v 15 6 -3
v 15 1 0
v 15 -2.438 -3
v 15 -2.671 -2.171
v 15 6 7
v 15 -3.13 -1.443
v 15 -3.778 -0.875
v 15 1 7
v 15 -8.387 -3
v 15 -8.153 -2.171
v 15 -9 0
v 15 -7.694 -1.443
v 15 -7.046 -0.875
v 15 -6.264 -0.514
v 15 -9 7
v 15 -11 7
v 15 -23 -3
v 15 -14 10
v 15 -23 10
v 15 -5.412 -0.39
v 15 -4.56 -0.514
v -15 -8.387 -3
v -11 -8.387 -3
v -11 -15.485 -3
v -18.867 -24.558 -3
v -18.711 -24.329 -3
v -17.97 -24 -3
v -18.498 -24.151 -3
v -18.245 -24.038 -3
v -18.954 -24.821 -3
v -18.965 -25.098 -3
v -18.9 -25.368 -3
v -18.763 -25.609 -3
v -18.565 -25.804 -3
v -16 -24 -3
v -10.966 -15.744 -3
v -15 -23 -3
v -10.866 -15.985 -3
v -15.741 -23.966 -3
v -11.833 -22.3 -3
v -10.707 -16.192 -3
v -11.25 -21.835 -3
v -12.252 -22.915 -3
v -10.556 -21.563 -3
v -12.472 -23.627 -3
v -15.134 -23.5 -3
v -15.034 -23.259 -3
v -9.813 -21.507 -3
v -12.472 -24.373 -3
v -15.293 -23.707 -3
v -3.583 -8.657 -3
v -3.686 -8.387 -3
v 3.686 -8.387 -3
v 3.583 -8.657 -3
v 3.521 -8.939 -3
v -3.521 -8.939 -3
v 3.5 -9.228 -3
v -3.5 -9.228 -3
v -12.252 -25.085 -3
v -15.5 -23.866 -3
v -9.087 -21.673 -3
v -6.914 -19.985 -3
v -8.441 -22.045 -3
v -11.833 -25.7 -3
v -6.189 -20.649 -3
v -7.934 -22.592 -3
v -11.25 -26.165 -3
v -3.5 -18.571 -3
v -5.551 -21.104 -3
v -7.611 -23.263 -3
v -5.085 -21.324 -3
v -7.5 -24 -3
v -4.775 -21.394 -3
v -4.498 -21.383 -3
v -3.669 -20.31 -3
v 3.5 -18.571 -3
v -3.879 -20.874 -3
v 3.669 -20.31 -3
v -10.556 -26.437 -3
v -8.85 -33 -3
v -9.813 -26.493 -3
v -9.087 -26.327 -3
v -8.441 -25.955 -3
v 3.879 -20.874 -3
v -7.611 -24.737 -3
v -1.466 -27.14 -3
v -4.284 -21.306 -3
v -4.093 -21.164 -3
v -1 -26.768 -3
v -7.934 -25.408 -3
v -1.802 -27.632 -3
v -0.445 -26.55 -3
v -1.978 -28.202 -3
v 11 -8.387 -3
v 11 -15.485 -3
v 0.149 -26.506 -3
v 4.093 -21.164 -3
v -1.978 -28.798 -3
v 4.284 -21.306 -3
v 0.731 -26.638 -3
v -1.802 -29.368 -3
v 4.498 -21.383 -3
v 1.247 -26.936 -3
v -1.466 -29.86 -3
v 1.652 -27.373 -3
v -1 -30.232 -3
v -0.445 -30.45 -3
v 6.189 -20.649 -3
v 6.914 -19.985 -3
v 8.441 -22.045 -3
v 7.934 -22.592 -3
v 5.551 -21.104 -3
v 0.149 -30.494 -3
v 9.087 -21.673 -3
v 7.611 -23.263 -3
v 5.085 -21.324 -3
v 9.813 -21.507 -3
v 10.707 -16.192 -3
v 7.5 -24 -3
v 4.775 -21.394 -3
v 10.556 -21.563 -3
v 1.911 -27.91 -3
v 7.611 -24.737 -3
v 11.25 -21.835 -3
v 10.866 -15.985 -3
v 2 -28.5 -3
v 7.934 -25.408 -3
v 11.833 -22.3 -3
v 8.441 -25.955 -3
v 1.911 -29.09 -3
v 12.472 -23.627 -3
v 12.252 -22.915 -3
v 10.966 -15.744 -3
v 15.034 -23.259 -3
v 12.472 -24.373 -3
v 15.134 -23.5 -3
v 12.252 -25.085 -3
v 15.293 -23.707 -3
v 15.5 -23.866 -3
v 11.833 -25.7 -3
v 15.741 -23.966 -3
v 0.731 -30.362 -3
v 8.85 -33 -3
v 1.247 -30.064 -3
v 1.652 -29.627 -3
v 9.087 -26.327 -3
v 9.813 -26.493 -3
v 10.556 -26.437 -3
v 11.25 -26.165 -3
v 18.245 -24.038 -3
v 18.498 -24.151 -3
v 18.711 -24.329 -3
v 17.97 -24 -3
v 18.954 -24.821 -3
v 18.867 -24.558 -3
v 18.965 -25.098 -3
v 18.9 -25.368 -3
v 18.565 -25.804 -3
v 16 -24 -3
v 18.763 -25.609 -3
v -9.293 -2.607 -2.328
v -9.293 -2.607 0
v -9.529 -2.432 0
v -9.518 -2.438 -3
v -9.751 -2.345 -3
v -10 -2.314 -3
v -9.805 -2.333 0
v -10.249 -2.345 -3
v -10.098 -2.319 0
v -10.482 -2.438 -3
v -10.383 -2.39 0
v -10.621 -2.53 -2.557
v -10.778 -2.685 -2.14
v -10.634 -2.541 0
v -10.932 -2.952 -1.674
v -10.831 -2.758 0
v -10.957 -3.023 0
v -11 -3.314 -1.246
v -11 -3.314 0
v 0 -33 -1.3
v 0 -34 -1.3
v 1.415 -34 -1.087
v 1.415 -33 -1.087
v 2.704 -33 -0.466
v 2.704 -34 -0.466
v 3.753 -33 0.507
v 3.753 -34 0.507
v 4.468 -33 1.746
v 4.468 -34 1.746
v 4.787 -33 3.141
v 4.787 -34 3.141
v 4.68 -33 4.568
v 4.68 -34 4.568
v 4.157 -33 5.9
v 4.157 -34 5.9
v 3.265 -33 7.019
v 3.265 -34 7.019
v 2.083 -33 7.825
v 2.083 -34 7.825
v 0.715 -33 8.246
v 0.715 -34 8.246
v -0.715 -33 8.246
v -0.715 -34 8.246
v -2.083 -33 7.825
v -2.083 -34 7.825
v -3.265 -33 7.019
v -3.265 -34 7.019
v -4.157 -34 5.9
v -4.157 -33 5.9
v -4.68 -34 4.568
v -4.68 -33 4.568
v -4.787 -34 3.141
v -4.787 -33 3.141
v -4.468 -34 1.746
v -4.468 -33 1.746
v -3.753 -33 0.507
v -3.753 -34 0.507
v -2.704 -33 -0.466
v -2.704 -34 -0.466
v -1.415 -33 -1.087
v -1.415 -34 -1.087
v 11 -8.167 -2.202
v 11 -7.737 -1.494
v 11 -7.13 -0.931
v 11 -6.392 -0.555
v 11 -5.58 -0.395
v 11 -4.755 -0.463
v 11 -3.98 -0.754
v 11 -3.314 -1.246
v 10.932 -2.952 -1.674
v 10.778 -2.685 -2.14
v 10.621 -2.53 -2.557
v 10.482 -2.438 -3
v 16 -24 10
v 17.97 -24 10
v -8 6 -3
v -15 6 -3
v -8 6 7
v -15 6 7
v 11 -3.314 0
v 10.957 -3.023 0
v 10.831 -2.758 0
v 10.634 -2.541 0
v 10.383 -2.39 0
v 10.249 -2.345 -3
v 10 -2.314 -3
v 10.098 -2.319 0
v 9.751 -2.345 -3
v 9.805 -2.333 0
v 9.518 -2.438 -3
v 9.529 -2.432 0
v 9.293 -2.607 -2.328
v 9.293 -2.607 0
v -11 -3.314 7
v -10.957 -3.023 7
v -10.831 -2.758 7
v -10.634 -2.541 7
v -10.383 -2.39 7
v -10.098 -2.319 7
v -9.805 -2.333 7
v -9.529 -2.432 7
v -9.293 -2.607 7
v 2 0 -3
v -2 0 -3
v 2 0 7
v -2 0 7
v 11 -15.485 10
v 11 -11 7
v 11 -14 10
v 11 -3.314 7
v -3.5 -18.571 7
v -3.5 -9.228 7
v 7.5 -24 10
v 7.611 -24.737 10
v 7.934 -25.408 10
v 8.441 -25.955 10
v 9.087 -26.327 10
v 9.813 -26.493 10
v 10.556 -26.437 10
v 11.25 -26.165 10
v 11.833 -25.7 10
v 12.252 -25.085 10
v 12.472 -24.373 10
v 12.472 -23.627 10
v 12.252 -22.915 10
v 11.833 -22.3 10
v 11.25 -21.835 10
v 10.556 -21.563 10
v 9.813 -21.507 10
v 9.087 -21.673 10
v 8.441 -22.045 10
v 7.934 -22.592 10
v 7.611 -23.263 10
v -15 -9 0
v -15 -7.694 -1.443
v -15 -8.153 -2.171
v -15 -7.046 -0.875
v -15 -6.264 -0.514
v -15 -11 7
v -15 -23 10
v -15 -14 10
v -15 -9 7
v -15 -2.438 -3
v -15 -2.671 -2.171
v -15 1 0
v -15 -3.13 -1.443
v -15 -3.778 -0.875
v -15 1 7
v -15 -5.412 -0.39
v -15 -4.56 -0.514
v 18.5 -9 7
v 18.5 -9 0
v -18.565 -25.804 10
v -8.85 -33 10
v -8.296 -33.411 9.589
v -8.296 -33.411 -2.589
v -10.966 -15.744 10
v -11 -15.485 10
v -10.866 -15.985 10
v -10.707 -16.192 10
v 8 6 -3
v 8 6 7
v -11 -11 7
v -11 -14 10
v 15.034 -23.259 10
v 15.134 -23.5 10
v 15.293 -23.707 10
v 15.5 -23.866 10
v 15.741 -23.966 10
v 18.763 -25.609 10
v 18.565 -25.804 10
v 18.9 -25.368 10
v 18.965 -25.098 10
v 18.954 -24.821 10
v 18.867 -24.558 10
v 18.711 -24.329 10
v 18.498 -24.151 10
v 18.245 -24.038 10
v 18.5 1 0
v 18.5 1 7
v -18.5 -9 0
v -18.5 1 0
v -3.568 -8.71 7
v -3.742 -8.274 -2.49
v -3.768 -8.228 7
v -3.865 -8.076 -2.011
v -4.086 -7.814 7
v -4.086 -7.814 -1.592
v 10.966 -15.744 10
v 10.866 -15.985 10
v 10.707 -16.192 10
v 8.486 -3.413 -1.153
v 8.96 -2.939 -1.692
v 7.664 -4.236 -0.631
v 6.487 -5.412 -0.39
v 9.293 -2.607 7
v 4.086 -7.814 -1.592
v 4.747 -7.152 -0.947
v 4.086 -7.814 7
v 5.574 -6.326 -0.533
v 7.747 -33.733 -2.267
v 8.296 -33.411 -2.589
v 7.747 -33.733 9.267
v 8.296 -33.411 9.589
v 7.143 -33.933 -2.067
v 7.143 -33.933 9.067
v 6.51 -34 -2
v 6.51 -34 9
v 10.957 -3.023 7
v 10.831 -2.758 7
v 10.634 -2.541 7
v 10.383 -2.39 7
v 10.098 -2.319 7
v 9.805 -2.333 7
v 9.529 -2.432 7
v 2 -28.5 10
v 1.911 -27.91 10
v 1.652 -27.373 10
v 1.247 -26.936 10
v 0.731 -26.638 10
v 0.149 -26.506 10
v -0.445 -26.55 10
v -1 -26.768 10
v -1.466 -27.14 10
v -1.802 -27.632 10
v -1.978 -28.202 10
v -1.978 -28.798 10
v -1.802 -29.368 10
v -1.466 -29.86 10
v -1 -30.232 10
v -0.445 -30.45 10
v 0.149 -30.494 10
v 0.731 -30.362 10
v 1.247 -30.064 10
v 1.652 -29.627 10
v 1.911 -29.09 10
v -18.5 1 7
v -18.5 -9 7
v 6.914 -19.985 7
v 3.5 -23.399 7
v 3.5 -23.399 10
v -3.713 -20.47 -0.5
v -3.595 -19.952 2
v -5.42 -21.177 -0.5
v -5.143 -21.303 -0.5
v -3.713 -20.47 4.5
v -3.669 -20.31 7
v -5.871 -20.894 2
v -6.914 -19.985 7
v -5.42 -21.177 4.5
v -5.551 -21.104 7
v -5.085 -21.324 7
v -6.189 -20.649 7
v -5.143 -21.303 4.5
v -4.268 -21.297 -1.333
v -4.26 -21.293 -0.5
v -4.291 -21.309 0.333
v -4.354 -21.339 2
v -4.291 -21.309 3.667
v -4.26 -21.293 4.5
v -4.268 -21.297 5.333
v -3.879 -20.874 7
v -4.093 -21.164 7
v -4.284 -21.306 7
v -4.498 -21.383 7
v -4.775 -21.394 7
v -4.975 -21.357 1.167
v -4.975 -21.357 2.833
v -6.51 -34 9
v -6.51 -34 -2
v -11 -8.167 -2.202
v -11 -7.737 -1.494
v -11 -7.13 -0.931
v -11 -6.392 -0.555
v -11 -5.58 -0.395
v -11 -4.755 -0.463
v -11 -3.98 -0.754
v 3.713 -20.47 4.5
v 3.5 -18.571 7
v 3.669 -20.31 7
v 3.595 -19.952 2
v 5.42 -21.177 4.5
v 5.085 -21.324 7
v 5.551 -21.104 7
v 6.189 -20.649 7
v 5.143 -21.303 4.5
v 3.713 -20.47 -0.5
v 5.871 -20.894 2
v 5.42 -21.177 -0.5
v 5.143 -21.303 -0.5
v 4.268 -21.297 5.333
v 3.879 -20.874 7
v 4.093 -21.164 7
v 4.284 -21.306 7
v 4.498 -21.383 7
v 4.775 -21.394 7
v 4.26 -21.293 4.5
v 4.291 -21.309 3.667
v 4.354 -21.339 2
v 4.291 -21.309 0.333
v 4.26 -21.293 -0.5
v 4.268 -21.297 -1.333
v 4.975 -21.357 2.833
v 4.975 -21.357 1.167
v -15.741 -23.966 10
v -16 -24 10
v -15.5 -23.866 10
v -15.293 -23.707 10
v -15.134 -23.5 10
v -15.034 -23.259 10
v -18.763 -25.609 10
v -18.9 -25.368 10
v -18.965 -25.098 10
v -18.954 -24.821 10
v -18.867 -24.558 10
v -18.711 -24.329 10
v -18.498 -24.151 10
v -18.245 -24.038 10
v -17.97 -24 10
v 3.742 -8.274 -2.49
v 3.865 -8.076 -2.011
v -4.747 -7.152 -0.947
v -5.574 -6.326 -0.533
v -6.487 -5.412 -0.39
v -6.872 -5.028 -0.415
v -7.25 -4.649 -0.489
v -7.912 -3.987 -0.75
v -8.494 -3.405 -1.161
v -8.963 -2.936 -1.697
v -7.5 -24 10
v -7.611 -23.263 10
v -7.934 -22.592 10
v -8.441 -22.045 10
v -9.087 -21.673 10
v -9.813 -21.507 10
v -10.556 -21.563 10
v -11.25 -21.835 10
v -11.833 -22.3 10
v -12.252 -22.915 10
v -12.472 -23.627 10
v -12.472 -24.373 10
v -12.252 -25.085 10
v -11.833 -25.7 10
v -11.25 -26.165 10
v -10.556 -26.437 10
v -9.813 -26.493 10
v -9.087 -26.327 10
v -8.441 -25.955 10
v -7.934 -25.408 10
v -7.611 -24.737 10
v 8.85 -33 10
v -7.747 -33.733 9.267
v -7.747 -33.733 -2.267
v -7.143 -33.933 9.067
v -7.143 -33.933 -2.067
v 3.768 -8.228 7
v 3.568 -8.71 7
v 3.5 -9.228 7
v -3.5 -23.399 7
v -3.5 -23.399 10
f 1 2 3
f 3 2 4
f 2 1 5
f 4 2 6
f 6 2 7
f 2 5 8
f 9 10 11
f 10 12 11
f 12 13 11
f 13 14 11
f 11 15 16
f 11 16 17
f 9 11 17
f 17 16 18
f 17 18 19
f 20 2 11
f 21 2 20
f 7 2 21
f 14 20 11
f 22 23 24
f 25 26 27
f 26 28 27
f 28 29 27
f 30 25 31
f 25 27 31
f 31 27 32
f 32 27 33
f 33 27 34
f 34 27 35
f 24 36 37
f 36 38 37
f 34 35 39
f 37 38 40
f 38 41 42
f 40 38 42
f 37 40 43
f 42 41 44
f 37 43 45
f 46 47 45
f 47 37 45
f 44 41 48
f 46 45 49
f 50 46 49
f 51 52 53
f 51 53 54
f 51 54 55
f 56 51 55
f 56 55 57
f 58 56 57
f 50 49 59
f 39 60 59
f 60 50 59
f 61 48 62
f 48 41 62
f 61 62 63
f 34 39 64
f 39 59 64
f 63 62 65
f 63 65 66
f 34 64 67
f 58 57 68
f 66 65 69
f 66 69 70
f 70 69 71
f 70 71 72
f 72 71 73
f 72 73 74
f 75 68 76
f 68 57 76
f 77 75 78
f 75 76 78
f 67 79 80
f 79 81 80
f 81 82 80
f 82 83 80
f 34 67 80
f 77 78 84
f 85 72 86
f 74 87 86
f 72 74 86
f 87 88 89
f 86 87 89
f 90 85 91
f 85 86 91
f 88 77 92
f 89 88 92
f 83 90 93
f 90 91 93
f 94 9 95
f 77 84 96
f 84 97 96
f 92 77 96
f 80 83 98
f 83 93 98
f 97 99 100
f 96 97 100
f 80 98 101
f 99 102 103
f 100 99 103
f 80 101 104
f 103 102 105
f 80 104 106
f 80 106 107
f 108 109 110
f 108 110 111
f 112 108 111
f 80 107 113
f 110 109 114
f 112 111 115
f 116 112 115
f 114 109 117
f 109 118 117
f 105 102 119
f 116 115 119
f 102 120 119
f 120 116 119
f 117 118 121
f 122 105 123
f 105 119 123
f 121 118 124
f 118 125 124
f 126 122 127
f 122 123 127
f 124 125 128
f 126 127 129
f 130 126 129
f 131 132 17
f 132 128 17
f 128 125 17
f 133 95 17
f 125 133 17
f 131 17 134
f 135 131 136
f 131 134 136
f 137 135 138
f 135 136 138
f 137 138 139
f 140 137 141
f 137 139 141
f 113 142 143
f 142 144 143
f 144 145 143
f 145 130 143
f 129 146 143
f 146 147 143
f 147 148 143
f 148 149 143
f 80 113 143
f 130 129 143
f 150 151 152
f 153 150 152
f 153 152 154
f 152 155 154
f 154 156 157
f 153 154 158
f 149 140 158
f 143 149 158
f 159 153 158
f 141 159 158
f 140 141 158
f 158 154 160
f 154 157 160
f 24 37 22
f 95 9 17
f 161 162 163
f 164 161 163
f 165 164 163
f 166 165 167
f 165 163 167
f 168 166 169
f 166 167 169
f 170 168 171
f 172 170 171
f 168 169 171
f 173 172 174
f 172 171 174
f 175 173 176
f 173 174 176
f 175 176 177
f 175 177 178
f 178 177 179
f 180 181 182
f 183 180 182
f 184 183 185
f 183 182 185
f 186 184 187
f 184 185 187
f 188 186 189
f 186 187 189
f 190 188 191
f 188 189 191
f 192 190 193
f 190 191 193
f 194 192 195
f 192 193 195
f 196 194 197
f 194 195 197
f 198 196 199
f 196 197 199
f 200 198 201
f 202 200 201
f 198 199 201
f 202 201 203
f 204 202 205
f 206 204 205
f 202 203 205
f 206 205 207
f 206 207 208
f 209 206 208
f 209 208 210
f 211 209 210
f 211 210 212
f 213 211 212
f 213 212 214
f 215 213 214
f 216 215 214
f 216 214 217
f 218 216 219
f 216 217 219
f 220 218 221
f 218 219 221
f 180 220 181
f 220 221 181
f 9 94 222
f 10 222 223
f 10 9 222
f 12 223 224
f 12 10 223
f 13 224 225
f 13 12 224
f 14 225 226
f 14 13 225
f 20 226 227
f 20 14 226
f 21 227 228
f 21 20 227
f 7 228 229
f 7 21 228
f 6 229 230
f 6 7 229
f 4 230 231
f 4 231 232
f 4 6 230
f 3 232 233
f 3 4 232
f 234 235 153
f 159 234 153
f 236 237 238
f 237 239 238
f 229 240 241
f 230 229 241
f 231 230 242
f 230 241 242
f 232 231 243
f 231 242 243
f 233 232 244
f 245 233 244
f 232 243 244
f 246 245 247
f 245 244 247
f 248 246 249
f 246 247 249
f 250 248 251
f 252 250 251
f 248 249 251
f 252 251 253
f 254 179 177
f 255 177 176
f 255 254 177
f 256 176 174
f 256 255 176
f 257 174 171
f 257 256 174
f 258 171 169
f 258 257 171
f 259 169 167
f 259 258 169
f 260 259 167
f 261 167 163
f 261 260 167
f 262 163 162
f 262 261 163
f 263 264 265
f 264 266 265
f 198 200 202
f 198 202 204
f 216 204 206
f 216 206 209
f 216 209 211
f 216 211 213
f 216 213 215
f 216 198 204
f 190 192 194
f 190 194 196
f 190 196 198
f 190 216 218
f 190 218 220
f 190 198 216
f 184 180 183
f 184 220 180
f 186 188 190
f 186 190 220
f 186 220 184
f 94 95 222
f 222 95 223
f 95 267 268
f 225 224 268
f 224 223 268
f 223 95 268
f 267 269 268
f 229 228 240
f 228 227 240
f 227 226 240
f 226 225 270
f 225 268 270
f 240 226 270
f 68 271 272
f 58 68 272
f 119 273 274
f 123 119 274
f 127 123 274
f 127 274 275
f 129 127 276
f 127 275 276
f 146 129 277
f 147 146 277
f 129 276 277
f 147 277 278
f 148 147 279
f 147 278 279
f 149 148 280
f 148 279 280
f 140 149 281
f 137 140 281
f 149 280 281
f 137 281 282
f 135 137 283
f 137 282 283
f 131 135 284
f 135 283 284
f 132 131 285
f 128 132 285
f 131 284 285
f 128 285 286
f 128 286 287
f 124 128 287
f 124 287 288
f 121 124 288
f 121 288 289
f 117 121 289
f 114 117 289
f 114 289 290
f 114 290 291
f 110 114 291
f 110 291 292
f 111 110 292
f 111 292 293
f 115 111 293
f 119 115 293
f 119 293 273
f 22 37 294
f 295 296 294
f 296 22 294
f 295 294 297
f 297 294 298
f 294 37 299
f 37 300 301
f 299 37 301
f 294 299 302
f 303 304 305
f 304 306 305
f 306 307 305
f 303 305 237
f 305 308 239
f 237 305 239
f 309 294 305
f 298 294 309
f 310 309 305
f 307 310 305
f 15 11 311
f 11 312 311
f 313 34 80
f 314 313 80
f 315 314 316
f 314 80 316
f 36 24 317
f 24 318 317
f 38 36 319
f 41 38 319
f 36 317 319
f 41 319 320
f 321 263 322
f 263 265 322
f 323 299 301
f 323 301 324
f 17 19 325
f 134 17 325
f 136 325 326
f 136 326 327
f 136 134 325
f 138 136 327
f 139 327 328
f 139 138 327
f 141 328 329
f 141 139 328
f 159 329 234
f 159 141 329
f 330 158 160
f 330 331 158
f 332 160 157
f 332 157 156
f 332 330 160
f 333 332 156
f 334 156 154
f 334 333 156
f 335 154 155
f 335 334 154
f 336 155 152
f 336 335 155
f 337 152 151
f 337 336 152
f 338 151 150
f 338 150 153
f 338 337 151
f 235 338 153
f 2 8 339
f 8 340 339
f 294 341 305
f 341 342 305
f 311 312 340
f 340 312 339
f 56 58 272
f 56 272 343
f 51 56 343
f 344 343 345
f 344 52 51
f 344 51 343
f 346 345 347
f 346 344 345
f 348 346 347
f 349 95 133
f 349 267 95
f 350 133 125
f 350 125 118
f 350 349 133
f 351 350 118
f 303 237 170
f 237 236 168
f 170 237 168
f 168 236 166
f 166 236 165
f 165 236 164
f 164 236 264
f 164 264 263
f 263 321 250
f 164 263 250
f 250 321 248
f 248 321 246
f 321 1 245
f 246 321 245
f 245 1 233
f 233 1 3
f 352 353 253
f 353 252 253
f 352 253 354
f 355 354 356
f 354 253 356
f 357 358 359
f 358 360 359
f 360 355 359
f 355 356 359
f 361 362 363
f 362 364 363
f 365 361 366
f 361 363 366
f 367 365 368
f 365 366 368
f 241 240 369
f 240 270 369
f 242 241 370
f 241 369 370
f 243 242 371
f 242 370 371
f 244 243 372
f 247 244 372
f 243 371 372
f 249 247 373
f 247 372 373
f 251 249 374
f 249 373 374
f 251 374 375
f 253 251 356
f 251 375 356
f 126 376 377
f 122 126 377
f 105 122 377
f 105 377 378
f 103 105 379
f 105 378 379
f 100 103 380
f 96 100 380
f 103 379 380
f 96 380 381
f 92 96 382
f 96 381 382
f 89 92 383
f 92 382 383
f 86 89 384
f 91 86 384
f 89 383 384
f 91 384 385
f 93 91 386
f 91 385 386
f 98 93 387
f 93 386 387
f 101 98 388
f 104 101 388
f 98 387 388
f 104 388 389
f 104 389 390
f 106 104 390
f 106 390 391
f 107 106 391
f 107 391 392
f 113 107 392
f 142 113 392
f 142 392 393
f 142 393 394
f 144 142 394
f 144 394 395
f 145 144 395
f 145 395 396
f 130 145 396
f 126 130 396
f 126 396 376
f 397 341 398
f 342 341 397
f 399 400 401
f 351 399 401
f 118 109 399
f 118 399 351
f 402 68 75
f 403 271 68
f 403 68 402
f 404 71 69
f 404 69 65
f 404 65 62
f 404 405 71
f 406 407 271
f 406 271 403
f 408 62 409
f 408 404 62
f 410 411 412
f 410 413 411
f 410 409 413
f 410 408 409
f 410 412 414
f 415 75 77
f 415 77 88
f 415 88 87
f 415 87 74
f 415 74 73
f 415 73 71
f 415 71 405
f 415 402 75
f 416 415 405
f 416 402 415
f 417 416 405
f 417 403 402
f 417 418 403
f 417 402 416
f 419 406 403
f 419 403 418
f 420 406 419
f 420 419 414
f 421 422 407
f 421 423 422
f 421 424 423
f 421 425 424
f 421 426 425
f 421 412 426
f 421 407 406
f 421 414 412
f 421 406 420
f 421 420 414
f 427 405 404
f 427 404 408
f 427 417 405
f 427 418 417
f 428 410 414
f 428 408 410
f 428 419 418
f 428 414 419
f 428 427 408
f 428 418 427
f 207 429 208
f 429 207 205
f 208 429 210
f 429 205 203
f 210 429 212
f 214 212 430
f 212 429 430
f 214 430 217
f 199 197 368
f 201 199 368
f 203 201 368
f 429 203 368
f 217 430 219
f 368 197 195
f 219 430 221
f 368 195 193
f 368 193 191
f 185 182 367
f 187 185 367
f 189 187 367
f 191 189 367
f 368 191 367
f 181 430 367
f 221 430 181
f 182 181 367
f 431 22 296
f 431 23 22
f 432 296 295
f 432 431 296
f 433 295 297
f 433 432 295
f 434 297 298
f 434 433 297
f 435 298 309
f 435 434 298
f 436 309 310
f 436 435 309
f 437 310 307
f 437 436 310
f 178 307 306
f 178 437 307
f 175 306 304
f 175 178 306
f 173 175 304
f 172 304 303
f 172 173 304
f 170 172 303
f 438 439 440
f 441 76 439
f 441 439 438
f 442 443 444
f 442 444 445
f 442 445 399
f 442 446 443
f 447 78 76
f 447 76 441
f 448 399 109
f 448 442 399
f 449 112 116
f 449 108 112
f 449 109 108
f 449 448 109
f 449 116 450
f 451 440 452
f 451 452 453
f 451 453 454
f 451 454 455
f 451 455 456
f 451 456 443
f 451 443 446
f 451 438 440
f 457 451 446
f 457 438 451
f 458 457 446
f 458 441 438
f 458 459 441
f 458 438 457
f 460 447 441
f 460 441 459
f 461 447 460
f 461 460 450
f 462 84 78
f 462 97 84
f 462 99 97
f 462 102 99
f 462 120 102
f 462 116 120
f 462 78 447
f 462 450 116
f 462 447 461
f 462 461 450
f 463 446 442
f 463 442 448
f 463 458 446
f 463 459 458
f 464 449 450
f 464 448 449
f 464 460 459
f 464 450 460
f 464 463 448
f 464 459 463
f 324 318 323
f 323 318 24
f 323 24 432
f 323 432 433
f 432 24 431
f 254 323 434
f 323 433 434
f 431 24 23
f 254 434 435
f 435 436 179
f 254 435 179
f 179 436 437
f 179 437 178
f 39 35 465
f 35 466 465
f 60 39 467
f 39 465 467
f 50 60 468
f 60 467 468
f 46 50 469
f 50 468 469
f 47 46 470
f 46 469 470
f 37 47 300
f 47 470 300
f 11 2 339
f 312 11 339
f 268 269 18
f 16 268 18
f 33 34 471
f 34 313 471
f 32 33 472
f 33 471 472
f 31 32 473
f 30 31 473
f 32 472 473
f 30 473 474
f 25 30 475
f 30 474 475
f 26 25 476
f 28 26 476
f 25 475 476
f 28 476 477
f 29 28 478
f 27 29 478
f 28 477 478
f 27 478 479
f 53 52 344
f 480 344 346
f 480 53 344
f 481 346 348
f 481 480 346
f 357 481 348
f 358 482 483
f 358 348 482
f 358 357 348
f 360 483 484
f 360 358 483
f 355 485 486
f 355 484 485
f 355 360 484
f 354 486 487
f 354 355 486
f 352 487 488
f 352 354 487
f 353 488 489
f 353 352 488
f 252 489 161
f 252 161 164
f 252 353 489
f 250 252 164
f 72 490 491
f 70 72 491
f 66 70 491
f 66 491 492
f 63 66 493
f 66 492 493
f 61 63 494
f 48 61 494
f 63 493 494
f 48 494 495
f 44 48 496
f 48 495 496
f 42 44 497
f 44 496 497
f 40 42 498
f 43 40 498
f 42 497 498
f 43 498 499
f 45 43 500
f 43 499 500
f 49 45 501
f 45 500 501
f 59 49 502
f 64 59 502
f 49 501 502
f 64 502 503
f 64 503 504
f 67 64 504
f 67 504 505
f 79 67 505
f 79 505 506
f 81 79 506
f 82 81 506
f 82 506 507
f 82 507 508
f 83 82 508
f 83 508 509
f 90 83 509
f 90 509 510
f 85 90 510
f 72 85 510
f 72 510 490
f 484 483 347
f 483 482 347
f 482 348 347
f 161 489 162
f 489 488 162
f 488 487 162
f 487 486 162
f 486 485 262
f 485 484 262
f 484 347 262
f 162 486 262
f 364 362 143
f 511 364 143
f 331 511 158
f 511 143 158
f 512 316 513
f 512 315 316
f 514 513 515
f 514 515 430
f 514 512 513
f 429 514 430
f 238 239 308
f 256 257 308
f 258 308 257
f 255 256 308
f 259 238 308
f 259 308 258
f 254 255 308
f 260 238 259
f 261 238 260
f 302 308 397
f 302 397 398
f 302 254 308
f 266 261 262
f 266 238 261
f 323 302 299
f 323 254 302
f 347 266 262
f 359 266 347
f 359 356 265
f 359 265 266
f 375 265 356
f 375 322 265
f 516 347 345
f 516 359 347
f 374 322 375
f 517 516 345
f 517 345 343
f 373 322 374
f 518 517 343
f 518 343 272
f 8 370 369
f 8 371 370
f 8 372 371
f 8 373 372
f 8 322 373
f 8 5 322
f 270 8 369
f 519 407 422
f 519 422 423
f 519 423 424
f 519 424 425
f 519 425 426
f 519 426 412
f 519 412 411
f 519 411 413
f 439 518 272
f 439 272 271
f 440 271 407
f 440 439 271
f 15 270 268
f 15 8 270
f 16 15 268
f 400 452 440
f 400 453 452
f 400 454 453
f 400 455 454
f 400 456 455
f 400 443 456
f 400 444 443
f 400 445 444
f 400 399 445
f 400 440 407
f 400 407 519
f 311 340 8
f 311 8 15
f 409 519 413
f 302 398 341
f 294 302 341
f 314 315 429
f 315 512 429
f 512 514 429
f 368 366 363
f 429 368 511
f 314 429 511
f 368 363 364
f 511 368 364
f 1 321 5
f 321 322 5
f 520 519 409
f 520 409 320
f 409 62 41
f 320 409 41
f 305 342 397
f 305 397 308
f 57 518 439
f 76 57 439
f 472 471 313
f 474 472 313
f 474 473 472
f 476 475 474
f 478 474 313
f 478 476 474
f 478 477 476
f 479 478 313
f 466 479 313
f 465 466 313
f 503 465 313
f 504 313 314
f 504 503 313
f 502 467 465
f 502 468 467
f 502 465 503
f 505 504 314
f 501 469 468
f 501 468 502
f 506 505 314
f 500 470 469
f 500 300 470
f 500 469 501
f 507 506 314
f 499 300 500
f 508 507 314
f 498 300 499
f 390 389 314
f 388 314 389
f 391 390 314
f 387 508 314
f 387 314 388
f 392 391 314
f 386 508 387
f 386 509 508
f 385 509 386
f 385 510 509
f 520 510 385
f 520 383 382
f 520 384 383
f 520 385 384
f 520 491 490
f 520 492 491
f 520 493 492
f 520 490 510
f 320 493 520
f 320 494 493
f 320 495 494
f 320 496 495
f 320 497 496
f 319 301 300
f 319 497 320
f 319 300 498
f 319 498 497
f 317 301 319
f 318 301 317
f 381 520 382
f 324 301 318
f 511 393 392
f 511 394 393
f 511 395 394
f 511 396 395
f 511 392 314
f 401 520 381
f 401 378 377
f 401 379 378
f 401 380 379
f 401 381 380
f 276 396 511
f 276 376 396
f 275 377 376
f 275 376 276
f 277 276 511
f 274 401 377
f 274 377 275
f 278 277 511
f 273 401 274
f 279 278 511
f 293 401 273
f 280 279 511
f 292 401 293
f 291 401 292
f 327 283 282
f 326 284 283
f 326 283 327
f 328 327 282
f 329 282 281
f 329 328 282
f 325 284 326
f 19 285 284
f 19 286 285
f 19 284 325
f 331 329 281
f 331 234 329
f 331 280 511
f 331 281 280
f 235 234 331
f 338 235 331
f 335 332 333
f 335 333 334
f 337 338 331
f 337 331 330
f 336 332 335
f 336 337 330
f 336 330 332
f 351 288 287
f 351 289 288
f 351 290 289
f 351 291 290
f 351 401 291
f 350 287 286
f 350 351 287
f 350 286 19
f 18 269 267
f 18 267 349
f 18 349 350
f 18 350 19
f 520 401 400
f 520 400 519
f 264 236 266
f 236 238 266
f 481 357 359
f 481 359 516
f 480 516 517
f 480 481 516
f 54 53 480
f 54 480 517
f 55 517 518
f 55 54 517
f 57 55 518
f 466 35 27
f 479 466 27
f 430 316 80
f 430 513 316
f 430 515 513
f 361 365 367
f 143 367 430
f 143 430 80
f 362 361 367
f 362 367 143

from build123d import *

# Parameters (mm, degrees)
ESQUISSE1_W             = 2.5
ESQUISSE1_H             = 10
BOSS_EXTRU_1_DEPTH      = 7
BOSS_EXTRU_2_DEPTH      = 3
BOSS_EXTRU_2_DEPTH_BACK = 10
ENL_V_MAT_EXTRU_1_REACH = 44.024
ESQUISSE4_4_W           = 7
ESQUISSE4_4_H           = 9.399494937
ENL_V_MAT_EXTRU_4_DEPTH = 3
ENL_V_START             = -13
ESQUISSE4_W             = 7
ESQUISSE4_H             = 9.399494937
ENL_V_MAT_EXTRU_2_DEPTH = 3
CHANFREIN1_SIZE         = 3
CONG_1_R                = 1
ESQUISSE5_R             = 4.8
ENL_V_MAT_EXTRU_5_DEPTH = 1
ESQUISSE6_R             = 2.5
ESQUISSE6_R_2           = 2
ENL_V_MAT_EXTRU_6_DEPTH = 42.047043387
CHANFREIN2_SIZE         = 1
SKETCH_1_W              = 7
SKETCH_1_H              = 5
CUT_EXTRUDE_1_DEPTH     = 1
SKETCH_2_W              = 7
SKETCH_2_H              = 5
CUT_EXTRUDE_2_DEPTH     = 1
EXTRUDE_1_DEPTH         = 3
FILLET_1_R              = 3
FILLET_2_R              = 1
FILLET_3_R              = 2
CUT_EXTRUDE_START       = -30
SKETCH_5_R              = 3
CUT_EXTRUDE_3_DEPTH     = 30


# Some blends are built 0.0001 mm under size
with BuildPart() as part:
    # Esquisse1 → Boss.-Extru.1 (new body)
    with BuildSketch(Plane.XY):
        Polygon((-8, 6), (-16, 6), (-16, 1), (-16, -9), (-16, -24), (-21, -24), (-7.5, -34), (0, -34), (0, 0), (-2, 0), align=None)
        Polygon((2, 0), (0, 0), (0, -34), (7.5, -34), (21, -24), (16, -24), (16, -9), (16, 1), (16, 6), (8, 6), align=None)
        with Locations((17.25, -4)):
            Rectangle(ESQUISSE1_W, ESQUISSE1_H)
        with Locations((-17.25, -4)):
            Rectangle(ESQUISSE1_W, ESQUISSE1_H)
    extrude(amount=BOSS_EXTRU_1_DEPTH)

    # Esquisse2 → Boss.-Extru.2 (add, two sides: drawn at the far end of the back side and taken through both)
    with BuildSketch(Plane.XY.offset(7).offset(-BOSS_EXTRU_2_DEPTH_BACK)):
        Polygon((16, -14), (-16, -14), (-16, -24), (-21, -24), (-7.5, -34), (7.5, -34), (21, -24), (16, -24), align=None)
    extrude(amount=BOSS_EXTRU_2_DEPTH + BOSS_EXTRU_2_DEPTH_BACK)

    # Esquisse3 → Enlèv. mat.-Extru.1 (cut, up to next)
    with BuildSketch(Plane(origin=(0, 0, -3), x_dir=(-1, 0, 0), z_dir=(0, 0, -1)), mode=Mode.PRIVATE) as enl_v_mat_extru_1_sk1:
        Polygon((-11, -0.899494937), (-3.5, -8.399494937), (-3.5, -23.399494937), (-11, -15.899494937), align=None)
    enl_v_mat_extru_1_tool1 = extrude(enl_v_mat_extru_1_sk1.sketch, amount=-ENL_V_MAT_EXTRU_1_REACH, mode=Mode.PRIVATE) & part.part
    # Esquisse3 → Enlèv. mat.-Extru.1 (cut, up to next)
    with BuildSketch(Plane(origin=(0, 0, -3), x_dir=(-1, 0, 0), z_dir=(0, 0, -1)), mode=Mode.PRIVATE) as enl_v_mat_extru_1_sk2:
        Polygon((11, -15.899494937), (11, -0.899494937), (3.5, -8.399494937), (3.5, -23.399494937), align=None)
    enl_v_mat_extru_1_tool2 = extrude(enl_v_mat_extru_1_sk2.sketch, amount=-ENL_V_MAT_EXTRU_1_REACH, mode=Mode.PRIVATE) & part.part
    add(enl_v_mat_extru_1_tool1.solids().sort_by_distance((7.25, -12.149495, -3))[0], mode=Mode.SUBTRACT)
    add(enl_v_mat_extru_1_tool2.solids().sort_by_distance((-7.25, -12.149495, -3))[0], mode=Mode.SUBTRACT)

    # Esquisse4<4> → Enlèv. mat.-Extru.4 (cut)
    with BuildSketch(Plane(origin=(0, 0, -3), x_dir=(-1, 0, 0), z_dir=(0, 0, -1))):
        with Locations((0, -18.699747469)):
            Rectangle(ESQUISSE4_4_W, ESQUISSE4_4_H)
    extrude(amount=-ENL_V_MAT_EXTRU_4_DEPTH, mode=Mode.SUBTRACT)

    # Esquisse4 → Enlèv. mat.-Extru.2 (cut)
    with BuildSketch(Plane(origin=(0, 0, -3), x_dir=(-1, 0, 0), z_dir=(0, 0, -1)).offset(ENL_V_START)):
        with Locations((0, -18.699747469)):
            Rectangle(ESQUISSE4_W, ESQUISSE4_H)
    extrude(amount=ENL_V_MAT_EXTRU_2_DEPTH, mode=Mode.SUBTRACT)

    # Chanfrein1
    chanfrein1_edges = [part.edges().sort_by_distance(p)[0] for p in [
        (-13.5, -14, 0),
        (-13.5, -14, 7),
        (13.5, -14, 0),
        (13.5, -14, 7),
    ]]
    chamfer(chanfrein1_edges, length=CHANFREIN1_SIZE - 0.0001)  # a hair under: the kernel refuses the full size

    # Congé1
    cong_1_edges = [part.edges().sort_by_distance(p)[0] for p in [
        (11, -15.899494937, 3.5),
        (11, -0.899494937, 3.5),
        (-11, -0.899494937, 3.5),
        (-11, -15.899494937, 3.5),
        (-21, -24, 3.5),
        (21, -24, 3.5),
    ]]
    fillet(cong_1_edges, radius=CONG_1_R)

    # Esquisse5 → Enlèv. mat.-Extru.5 (cut)
    with BuildSketch(Plane.XZ.offset(34)):
        with Locations(Location((0, 3.5, 0), (0, 0, 270))):
            Circle(ESQUISSE5_R)
    extrude(amount=-ENL_V_MAT_EXTRU_5_DEPTH, mode=Mode.SUBTRACT)

    # Esquisse6 → Enlèv. mat.-Extru.6 (cut, through all)
    with BuildSketch(Plane.XY.offset(10)):
        with Locations((-10, -24)):
            Circle(ESQUISSE6_R)
        with Locations((0, -28.5)):
            Circle(ESQUISSE6_R_2)
        with Locations(Location((10, -24, 0), (0, 0, 180))):
            Circle(ESQUISSE6_R)
    extrude(amount=-ENL_V_MAT_EXTRU_6_DEPTH, mode=Mode.SUBTRACT)

    # Chanfrein2
    chanfrein2_edges = [part.edges().sort_by_distance(p)[0] for p in [
        (0, -34, -3),
        (0, -34, 10),
    ]]
    chamfer(chanfrein2_edges, length=CHANFREIN2_SIZE)

    # Эскиз1 → Вырез-Вытянуть1 (cut)
    with BuildSketch(Plane(origin=(16, 0, 0), x_dir=(0, 0, -1), z_dir=(1, 0, 0))):
        with Locations((-3.5, 3.5)):
            Rectangle(SKETCH_1_W, SKETCH_1_H)
        Polygon((-10, -24), (3, -24), (3, -14), (0, -11), (0, -9), (-7, -9), (-7, -11), (-10, -14), align=None)
    extrude(amount=-CUT_EXTRUDE_1_DEPTH, mode=Mode.SUBTRACT)

    # Эскиз2 → Вырез-Вытянуть2 (cut)
    with BuildSketch(Plane.ZY.offset(16)):
        with Locations((3.5, 3.5)):
            Rectangle(SKETCH_2_W, SKETCH_2_H)
        Polygon((10, -24), (10, -14), (7, -11), (7, -9), (0, -9), (0, -11), (-3, -14), (-3, -24), align=None)
    extrude(amount=-CUT_EXTRUDE_2_DEPTH, mode=Mode.SUBTRACT)

    # Эскиз4 → Бобышка-Вытянуть1 (add)
    with BuildSketch(Plane(origin=(0, 0, 0), x_dir=(-1, 0, 0), z_dir=(0, 0, -1))):
        with BuildLine():
            Line((15, -14), (15, -11))
            Line((15, -11), (15, -9))
            Line((15, -9), (15, 6))
            Line((15, 6), (8, 6))
            Line((8, 6), (2, 0))
            Line((2, 0), (-2, 0))
            Line((-2, 0), (-8, 6))
            Line((-8, 6), (-15, 6))
            Line((-15, 6), (-15, -9))
            Line((-15, -9), (-15, -11))
            Line((-15, -11), (-15, -14))
            Line((-15, -14), (-11, -14))
            Line((-11, -14), (-11, -11))
            Line((-11, -11), (-11, -3.313708499))
            ThreePointArc((-11, -3.313708499), (-10.382683432, -2.389828966), (-9.292893219, -2.606601718))
            Line((-9.292893219, -2.606601718), (-3.5, -8.399494937))
            Line((-3.5, -8.399494937), (-3.5, -23.399494937))
            Line((-3.5, -23.399494937), (3.5, -23.399494937))
            Line((3.5, -23.399494937), (3.5, -8.399494937))
            Line((3.5, -8.399494937), (9.292893219, -2.606601718))
            ThreePointArc((9.292893219, -2.606601718), (10.382683432, -2.389828966), (11, -3.313708499))
            Line((11, -3.313708499), (11, -11))
            Line((11, -11), (11, -14))
            Line((11, -14), (15, -14))
        make_face()
    extrude(amount=EXTRUDE_1_DEPTH)

    # Скругление1
    fillet_1_edges = [part.edges().sort_by_distance(p)[0] for p in [
        (-7.5, -34, 3.5),
        (7.5, -34, 3.5),
    ]]
    fillet(fillet_1_edges, radius=FILLET_1_R)

    # Скругление2
    fillet_2_edges = [part.edges().sort_by_distance(p)[0] for p in [
        (15, -24, 3.5),
        (-15, -24, 3.5),
    ]]
    fillet(fillet_2_edges, radius=FILLET_2_R)

    # Скругление3
    fillet_3_edges = [part.edges().sort_by_distance(p)[0] for p in [
        (3.5, -8.399494937, 2),
        (-3.5, -8.399494937, 2),
    ]]
    fillet(fillet_3_edges, radius=FILLET_3_R)

    # Скругление4
    # a fillet whose section is not a circle: 2 mm, written as the material it adds along each edge
    with BuildSketch(Plane(origin=(-3.5, -23.399494937, 7), x_dir=(0, 1, 0), z_dir=(0, 0, -1)), Plane(origin=(3.5, -23.399494937, -3), x_dir=(0, 1, 0), z_dir=(0, 0, 1))) as fillet_4_piece_1:
        with BuildLine():
            Bezier((4.828427125, 0), (0, 0), (3.414213562, -3.414213562), weights=[1, 1, 1])
            Line((3.414213562, -3.414213562), (0, 0))
            Line((0, 0), (4.828427125, 0))
        make_face()
    extrude(amount=10)

    # Эскиз5 → Вырез-Вытянуть3 (cut)
    with BuildSketch(Plane.ZY.offset(15).offset(CUT_EXTRUDE_START)):
        with Locations((-3.39031082, -5.412141647)):
            Circle(SKETCH_5_R)
    extrude(amount=CUT_EXTRUDE_3_DEPTH, mode=Mode.SUBTRACT)


solid = part.part
